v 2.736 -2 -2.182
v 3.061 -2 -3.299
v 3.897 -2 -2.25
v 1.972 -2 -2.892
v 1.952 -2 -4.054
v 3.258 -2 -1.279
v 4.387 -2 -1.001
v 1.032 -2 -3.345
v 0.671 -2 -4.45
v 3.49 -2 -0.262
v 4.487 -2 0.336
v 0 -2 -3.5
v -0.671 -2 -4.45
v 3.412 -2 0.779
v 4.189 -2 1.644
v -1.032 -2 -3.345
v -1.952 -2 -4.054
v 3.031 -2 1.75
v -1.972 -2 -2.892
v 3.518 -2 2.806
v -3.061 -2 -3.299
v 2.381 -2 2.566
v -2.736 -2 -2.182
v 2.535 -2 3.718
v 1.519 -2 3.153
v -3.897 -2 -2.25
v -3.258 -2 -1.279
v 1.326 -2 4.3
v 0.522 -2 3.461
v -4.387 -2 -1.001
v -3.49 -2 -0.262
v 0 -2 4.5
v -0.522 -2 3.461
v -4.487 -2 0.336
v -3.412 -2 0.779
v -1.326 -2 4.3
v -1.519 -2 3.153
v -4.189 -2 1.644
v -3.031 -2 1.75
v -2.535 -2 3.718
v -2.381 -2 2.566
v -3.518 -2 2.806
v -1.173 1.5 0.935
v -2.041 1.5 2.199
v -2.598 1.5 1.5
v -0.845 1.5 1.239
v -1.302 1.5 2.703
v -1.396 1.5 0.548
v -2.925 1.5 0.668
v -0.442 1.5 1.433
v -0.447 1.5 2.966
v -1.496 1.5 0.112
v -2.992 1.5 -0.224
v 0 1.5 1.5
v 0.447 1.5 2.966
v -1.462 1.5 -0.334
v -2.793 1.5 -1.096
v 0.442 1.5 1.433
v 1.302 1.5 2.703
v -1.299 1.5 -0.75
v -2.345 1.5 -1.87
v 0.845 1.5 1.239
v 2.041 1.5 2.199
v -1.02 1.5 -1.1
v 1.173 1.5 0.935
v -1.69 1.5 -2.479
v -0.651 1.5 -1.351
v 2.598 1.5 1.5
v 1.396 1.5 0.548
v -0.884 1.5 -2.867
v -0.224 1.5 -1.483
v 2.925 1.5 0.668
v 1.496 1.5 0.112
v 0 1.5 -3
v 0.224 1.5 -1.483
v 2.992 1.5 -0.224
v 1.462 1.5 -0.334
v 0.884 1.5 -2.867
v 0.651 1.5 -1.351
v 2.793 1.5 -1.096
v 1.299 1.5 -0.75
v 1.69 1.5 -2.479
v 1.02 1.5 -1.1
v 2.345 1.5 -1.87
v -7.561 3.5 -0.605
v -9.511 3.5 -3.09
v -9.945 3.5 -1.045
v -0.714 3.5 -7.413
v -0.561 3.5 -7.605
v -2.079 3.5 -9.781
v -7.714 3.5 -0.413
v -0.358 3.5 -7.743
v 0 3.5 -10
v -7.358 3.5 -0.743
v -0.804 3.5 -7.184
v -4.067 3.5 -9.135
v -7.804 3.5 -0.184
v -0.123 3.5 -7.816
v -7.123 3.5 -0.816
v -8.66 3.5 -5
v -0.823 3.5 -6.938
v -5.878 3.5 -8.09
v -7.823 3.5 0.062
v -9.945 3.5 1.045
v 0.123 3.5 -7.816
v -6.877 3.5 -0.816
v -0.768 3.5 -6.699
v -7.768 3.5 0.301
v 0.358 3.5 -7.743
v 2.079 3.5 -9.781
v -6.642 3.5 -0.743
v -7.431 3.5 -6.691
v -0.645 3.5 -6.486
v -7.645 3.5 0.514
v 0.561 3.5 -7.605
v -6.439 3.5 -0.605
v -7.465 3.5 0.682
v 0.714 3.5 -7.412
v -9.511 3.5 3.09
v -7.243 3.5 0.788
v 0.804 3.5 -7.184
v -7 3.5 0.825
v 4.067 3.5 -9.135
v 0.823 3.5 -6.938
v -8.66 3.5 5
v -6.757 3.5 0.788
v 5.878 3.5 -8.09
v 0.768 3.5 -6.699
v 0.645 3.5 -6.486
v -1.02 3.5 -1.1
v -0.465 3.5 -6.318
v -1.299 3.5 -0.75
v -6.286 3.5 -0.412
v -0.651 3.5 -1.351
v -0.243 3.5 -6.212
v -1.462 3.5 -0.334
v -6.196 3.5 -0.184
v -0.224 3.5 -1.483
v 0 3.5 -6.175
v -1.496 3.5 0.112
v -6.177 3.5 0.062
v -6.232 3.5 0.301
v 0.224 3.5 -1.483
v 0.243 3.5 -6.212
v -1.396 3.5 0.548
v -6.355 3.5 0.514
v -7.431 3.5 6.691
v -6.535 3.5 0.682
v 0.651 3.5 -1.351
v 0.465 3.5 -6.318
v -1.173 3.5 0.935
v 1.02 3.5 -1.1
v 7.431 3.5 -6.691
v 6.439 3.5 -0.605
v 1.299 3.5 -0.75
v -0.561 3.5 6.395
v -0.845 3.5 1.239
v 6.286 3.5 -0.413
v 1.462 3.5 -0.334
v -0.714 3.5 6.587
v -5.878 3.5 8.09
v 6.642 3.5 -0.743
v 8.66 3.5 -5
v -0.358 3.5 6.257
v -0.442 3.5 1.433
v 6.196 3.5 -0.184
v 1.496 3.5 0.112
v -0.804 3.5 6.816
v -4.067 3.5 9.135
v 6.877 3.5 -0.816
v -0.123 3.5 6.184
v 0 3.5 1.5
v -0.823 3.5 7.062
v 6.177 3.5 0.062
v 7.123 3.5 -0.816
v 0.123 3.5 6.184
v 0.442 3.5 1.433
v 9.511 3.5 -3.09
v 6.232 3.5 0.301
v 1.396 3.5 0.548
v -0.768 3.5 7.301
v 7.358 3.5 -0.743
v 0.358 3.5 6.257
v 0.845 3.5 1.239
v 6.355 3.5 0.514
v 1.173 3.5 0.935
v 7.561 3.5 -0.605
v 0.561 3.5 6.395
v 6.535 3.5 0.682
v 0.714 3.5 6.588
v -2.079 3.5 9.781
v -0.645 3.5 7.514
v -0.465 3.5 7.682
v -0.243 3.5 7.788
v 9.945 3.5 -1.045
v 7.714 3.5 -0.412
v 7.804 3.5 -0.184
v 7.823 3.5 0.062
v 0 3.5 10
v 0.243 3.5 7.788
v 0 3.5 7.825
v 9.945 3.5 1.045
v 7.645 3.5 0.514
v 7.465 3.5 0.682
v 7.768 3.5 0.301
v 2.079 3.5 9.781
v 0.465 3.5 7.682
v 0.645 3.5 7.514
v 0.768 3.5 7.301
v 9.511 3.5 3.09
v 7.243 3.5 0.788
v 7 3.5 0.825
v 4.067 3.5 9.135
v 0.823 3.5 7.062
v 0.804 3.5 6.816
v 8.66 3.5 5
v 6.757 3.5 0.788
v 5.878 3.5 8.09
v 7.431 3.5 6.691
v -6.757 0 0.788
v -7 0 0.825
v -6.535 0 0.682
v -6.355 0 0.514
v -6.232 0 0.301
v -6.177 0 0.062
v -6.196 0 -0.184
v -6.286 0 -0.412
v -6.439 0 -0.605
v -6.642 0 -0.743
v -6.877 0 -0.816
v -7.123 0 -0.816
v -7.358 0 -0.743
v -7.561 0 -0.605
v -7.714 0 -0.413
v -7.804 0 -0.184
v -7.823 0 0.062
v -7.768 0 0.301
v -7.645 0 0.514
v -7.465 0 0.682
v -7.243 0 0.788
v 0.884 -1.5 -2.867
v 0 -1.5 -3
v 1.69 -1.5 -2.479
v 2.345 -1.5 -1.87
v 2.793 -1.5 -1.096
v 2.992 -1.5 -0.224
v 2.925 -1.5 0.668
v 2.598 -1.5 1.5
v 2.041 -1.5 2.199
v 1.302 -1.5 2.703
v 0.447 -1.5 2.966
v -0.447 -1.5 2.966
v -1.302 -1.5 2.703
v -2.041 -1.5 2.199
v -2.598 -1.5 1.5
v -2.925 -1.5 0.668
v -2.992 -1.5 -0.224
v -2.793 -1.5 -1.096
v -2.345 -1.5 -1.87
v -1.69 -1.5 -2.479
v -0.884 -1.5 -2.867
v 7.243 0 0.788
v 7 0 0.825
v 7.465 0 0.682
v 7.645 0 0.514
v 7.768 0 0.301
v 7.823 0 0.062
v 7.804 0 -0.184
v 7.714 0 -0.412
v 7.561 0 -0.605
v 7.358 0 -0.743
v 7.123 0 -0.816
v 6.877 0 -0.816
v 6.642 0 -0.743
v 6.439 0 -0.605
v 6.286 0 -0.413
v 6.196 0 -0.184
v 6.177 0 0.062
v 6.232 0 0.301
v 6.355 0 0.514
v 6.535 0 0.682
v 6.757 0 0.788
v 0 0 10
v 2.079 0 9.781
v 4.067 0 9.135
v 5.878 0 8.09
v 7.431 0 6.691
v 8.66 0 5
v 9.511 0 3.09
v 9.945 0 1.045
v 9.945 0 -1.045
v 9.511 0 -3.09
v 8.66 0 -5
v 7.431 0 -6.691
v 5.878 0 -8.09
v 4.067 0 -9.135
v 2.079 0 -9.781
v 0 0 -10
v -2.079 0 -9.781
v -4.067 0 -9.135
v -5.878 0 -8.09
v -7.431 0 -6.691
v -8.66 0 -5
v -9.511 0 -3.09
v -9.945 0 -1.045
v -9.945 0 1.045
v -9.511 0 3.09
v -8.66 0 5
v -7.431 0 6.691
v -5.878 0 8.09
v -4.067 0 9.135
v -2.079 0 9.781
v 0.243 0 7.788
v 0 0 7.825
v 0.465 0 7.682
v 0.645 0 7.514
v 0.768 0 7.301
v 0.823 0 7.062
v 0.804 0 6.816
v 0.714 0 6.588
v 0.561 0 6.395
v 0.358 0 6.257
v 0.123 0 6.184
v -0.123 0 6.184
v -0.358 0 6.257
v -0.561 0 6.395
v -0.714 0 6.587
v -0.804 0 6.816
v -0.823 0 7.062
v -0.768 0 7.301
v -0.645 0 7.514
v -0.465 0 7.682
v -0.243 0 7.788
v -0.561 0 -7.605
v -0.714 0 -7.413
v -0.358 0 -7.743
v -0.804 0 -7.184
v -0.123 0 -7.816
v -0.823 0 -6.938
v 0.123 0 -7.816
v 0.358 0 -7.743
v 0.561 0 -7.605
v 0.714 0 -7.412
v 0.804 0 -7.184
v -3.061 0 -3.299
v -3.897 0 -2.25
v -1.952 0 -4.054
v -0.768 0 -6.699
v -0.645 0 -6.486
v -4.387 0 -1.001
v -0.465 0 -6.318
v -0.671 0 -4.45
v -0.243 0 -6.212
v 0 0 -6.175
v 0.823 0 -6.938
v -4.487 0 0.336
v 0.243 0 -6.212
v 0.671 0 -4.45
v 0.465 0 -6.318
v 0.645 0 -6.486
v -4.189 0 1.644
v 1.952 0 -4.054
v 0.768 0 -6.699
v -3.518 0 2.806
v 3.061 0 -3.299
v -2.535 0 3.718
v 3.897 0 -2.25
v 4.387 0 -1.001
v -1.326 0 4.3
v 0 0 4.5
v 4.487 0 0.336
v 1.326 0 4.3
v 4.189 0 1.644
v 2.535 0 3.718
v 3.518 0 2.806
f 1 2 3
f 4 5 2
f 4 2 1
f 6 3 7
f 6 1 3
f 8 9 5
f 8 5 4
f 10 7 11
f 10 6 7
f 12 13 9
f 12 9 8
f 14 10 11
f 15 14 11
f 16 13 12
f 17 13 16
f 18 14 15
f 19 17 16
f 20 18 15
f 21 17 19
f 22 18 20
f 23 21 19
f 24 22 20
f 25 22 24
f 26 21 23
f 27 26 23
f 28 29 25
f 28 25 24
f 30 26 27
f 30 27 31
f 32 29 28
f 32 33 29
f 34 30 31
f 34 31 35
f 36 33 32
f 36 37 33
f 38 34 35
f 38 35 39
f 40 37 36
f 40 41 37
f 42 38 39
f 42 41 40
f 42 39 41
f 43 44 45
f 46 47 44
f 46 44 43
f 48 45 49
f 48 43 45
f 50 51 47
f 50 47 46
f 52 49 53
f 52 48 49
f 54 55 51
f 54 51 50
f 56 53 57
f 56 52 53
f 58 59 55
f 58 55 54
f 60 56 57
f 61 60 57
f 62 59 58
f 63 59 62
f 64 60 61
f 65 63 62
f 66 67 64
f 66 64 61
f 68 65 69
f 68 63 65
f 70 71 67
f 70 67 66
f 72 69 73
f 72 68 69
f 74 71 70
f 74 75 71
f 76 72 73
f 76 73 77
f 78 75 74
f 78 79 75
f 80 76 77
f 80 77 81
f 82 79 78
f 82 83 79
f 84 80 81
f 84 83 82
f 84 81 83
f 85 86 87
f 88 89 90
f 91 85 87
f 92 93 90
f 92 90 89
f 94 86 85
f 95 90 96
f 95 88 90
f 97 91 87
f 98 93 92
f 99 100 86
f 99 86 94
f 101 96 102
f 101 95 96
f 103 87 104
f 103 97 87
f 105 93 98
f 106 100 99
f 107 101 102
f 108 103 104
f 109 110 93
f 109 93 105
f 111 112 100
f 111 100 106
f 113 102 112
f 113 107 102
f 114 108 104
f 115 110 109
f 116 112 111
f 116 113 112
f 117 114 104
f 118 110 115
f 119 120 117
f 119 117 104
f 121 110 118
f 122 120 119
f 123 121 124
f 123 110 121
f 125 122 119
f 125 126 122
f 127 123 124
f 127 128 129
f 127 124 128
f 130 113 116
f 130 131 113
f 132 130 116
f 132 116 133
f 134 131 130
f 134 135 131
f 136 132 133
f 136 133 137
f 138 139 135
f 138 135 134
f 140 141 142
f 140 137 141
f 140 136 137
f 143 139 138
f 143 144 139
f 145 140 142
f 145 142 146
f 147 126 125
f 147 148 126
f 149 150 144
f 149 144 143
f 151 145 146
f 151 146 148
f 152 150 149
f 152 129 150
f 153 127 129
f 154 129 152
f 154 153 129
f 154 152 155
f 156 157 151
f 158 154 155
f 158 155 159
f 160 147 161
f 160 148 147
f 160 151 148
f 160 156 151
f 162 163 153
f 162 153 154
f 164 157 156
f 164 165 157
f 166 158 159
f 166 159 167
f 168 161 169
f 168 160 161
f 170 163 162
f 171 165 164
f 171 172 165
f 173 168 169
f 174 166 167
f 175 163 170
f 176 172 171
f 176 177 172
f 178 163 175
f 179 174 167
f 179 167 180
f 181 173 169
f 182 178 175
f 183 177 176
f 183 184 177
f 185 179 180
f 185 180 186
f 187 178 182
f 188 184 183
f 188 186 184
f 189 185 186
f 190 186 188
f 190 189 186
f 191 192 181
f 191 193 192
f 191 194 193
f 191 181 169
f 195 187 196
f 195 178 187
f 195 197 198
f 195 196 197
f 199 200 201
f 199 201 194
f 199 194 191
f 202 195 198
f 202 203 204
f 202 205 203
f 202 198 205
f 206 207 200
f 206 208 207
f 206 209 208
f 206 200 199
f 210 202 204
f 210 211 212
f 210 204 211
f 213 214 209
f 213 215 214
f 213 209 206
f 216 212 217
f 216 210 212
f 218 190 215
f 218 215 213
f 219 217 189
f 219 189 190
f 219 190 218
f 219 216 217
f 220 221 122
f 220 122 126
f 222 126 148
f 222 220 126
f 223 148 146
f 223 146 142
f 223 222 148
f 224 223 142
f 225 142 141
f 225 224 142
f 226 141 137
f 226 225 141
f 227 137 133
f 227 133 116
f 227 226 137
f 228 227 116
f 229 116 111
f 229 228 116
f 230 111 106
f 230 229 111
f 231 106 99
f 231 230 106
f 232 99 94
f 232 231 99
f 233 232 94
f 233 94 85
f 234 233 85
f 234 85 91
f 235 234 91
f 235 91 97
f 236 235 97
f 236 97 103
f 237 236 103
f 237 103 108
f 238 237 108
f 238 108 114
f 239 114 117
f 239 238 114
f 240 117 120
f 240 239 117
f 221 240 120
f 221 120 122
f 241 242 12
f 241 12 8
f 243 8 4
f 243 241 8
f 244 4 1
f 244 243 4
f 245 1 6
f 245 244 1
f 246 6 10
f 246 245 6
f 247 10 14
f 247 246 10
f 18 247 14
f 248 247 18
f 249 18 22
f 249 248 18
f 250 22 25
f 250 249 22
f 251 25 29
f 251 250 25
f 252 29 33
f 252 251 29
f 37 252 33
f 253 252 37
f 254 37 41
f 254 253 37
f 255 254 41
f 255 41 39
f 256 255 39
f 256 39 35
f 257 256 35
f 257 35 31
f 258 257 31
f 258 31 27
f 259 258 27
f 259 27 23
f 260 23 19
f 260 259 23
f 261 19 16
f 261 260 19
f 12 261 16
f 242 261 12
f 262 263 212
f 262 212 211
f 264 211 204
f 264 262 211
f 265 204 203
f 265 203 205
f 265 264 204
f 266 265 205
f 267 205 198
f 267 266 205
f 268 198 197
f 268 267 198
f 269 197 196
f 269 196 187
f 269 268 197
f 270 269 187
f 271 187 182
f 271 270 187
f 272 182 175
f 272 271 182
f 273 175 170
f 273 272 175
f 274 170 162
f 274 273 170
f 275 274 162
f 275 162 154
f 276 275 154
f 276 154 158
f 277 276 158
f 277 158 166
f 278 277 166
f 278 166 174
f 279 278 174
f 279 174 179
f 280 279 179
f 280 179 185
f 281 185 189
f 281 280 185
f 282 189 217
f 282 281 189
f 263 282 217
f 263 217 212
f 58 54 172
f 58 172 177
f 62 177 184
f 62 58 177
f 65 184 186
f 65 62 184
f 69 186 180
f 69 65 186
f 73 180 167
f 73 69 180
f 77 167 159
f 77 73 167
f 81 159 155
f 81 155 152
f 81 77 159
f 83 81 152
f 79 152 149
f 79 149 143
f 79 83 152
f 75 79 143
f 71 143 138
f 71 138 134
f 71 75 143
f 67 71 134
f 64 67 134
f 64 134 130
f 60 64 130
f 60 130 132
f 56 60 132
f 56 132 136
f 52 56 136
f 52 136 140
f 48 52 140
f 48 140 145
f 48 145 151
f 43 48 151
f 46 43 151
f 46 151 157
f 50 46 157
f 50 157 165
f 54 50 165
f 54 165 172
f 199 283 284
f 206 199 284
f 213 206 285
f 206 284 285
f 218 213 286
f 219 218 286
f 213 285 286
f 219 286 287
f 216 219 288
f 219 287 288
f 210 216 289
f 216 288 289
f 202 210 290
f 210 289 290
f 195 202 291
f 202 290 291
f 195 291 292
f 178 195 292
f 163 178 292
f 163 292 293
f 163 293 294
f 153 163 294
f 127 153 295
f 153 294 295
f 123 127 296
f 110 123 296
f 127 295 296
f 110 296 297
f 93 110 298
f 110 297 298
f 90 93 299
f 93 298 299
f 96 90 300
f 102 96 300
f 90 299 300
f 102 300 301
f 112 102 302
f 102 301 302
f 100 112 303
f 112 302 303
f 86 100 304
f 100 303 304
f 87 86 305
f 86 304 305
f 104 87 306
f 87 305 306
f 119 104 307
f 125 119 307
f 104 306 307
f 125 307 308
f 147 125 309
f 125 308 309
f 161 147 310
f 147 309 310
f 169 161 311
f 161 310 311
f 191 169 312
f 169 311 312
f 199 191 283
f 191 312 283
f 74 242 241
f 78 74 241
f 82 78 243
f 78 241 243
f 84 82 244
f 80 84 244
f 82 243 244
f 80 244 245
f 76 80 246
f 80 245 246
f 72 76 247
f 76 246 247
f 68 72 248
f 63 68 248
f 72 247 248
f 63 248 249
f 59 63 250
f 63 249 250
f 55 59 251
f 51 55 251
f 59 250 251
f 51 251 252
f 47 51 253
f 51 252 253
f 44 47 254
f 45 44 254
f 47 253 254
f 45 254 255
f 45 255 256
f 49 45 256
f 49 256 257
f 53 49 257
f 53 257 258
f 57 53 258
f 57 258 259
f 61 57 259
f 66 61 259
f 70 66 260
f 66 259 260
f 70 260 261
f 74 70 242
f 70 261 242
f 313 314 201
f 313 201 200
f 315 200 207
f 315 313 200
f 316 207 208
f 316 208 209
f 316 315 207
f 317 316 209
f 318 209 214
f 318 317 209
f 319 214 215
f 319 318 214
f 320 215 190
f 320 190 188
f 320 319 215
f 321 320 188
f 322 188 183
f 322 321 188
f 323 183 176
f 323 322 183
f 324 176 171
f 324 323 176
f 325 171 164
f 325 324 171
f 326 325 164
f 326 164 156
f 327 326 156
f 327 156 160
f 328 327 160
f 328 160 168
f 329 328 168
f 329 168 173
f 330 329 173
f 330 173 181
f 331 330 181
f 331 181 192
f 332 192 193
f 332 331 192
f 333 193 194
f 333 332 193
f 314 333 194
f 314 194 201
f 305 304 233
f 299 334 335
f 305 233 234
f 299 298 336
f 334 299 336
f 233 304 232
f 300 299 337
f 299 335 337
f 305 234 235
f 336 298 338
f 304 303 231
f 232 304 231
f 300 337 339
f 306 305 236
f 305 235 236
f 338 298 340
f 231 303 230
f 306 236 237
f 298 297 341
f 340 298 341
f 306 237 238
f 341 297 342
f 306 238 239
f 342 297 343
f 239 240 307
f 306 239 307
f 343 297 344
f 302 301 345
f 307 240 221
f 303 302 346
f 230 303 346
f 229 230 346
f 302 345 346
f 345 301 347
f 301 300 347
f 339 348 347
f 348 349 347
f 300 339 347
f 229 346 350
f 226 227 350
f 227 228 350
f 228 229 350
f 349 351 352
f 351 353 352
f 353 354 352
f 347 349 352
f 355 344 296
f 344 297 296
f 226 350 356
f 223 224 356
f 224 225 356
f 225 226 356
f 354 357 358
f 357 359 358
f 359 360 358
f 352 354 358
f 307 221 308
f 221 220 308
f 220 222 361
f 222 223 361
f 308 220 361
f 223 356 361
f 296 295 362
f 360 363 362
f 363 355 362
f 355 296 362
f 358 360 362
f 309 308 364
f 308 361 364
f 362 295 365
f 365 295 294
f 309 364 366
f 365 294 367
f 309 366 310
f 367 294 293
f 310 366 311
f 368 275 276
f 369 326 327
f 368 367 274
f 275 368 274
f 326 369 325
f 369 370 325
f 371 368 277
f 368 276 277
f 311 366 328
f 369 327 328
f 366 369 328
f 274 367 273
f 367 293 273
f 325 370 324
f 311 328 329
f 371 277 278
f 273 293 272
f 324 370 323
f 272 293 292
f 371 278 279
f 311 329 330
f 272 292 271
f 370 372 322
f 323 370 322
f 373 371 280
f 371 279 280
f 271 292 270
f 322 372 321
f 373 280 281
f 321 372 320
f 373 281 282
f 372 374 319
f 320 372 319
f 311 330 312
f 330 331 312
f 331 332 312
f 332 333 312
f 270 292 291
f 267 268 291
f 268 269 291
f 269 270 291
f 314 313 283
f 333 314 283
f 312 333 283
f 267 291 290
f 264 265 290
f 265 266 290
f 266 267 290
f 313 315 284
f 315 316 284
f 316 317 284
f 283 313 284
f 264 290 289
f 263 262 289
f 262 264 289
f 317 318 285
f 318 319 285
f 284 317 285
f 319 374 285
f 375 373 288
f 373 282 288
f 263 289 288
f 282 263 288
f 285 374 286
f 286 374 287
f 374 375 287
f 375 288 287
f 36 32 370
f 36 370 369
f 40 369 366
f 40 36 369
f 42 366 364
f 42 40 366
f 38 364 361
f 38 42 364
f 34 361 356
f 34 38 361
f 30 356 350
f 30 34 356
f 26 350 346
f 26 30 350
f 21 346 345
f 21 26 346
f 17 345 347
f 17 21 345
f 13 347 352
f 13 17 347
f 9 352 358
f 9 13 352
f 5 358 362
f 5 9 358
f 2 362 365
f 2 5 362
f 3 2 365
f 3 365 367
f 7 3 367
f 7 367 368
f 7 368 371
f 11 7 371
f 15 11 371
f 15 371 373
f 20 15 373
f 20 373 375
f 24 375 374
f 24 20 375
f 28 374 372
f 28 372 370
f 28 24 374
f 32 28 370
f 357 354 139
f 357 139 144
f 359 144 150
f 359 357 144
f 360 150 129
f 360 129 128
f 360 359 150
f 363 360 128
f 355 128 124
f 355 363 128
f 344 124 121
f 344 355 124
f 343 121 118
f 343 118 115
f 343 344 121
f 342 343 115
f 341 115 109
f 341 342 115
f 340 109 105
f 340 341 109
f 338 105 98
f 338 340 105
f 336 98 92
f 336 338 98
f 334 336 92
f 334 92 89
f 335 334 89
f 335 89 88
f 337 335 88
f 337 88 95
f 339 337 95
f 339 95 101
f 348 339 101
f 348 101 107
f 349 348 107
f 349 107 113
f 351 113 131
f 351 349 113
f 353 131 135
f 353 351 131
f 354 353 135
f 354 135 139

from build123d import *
from build123d.topology import SkipClean

# Parameters (mm, degrees)
SKETCH1_R           = 10
SKETCH1_R_2         = 1.5
SKETCH1_R_3         = 0.825
BOSS_EXTRUDE1_DEPTH = 3.5
BOSS_EXTRUDE2_START = 2
SKETCH2_R           = 4.5
SKETCH2_R_2         = 1.5
BOSS_EXTRUDE2_DEPTH = 2
SKETCH3_R           = 3
CUT_EXTRUDE1_DEPTH  = 3.5
CHAMFER1_SIZE       = 0.5


with BuildPart() as part:
    # Sketch1 → Boss-Extrude1 (new body)
    with BuildSketch(Plane(origin=(0, 0, 0), x_dir=(1, 0, 0), z_dir=(0, 1, 0))):
        with Locations(Location((0, 0, 0), (0, 0, 270))):
            Circle(SKETCH1_R)
        with Locations(Location((0, 0, 0), (0, 0, 270))):
            Circle(SKETCH1_R_2, mode=Mode.SUBTRACT)
        with Locations(Location((0, 7, 0), (0, 0, 270))):
            Circle(SKETCH1_R_3, mode=Mode.SUBTRACT)
        with Locations(Location((7, 0, 0), (0, 0, 270))):
            Circle(SKETCH1_R_3, mode=Mode.SUBTRACT)
        with Locations(Location((0, -7, 0), (0, 0, 270))):
            Circle(SKETCH1_R_3, mode=Mode.SUBTRACT)
        with Locations(Location((-7, 0, 0), (0, 0, 270))):
            Circle(SKETCH1_R_3, mode=Mode.SUBTRACT)
    extrude(amount=BOSS_EXTRUDE1_DEPTH)

    # Sketch2 → Boss-Extrude2 (add)
    with SkipClean():  # the faces are left unmerged after this step: merging them gives an invalid solid
        with BuildSketch(Plane.XZ.offset(BOSS_EXTRUDE2_START)):
            with Locations(Location((0, 0, 0), (0, 0, 90))):
                Circle(SKETCH2_R)
            with Locations(Location((0, 0, 0), (0, 0, 270))):
                Circle(SKETCH2_R_2, mode=Mode.SUBTRACT)
        extrude(amount=-BOSS_EXTRUDE2_DEPTH)

    # Sketch3 → Cut-Extrude1 (cut)
    with BuildSketch(Plane.XZ.offset(2)):
        with Locations(Location((0, 0, 0), (0, 0, 270))):
            Circle(SKETCH3_R)
    extrude(amount=-CUT_EXTRUDE1_DEPTH, mode=Mode.SUBTRACT)

    # Chamfer1
    chamfer1_edges = [part.edges().sort_by_distance(p)[0] for p in [
        (0, -2, 3),
    ]]
    chamfer(chamfer1_edges, length=CHAMFER1_SIZE)


solid = part.part
